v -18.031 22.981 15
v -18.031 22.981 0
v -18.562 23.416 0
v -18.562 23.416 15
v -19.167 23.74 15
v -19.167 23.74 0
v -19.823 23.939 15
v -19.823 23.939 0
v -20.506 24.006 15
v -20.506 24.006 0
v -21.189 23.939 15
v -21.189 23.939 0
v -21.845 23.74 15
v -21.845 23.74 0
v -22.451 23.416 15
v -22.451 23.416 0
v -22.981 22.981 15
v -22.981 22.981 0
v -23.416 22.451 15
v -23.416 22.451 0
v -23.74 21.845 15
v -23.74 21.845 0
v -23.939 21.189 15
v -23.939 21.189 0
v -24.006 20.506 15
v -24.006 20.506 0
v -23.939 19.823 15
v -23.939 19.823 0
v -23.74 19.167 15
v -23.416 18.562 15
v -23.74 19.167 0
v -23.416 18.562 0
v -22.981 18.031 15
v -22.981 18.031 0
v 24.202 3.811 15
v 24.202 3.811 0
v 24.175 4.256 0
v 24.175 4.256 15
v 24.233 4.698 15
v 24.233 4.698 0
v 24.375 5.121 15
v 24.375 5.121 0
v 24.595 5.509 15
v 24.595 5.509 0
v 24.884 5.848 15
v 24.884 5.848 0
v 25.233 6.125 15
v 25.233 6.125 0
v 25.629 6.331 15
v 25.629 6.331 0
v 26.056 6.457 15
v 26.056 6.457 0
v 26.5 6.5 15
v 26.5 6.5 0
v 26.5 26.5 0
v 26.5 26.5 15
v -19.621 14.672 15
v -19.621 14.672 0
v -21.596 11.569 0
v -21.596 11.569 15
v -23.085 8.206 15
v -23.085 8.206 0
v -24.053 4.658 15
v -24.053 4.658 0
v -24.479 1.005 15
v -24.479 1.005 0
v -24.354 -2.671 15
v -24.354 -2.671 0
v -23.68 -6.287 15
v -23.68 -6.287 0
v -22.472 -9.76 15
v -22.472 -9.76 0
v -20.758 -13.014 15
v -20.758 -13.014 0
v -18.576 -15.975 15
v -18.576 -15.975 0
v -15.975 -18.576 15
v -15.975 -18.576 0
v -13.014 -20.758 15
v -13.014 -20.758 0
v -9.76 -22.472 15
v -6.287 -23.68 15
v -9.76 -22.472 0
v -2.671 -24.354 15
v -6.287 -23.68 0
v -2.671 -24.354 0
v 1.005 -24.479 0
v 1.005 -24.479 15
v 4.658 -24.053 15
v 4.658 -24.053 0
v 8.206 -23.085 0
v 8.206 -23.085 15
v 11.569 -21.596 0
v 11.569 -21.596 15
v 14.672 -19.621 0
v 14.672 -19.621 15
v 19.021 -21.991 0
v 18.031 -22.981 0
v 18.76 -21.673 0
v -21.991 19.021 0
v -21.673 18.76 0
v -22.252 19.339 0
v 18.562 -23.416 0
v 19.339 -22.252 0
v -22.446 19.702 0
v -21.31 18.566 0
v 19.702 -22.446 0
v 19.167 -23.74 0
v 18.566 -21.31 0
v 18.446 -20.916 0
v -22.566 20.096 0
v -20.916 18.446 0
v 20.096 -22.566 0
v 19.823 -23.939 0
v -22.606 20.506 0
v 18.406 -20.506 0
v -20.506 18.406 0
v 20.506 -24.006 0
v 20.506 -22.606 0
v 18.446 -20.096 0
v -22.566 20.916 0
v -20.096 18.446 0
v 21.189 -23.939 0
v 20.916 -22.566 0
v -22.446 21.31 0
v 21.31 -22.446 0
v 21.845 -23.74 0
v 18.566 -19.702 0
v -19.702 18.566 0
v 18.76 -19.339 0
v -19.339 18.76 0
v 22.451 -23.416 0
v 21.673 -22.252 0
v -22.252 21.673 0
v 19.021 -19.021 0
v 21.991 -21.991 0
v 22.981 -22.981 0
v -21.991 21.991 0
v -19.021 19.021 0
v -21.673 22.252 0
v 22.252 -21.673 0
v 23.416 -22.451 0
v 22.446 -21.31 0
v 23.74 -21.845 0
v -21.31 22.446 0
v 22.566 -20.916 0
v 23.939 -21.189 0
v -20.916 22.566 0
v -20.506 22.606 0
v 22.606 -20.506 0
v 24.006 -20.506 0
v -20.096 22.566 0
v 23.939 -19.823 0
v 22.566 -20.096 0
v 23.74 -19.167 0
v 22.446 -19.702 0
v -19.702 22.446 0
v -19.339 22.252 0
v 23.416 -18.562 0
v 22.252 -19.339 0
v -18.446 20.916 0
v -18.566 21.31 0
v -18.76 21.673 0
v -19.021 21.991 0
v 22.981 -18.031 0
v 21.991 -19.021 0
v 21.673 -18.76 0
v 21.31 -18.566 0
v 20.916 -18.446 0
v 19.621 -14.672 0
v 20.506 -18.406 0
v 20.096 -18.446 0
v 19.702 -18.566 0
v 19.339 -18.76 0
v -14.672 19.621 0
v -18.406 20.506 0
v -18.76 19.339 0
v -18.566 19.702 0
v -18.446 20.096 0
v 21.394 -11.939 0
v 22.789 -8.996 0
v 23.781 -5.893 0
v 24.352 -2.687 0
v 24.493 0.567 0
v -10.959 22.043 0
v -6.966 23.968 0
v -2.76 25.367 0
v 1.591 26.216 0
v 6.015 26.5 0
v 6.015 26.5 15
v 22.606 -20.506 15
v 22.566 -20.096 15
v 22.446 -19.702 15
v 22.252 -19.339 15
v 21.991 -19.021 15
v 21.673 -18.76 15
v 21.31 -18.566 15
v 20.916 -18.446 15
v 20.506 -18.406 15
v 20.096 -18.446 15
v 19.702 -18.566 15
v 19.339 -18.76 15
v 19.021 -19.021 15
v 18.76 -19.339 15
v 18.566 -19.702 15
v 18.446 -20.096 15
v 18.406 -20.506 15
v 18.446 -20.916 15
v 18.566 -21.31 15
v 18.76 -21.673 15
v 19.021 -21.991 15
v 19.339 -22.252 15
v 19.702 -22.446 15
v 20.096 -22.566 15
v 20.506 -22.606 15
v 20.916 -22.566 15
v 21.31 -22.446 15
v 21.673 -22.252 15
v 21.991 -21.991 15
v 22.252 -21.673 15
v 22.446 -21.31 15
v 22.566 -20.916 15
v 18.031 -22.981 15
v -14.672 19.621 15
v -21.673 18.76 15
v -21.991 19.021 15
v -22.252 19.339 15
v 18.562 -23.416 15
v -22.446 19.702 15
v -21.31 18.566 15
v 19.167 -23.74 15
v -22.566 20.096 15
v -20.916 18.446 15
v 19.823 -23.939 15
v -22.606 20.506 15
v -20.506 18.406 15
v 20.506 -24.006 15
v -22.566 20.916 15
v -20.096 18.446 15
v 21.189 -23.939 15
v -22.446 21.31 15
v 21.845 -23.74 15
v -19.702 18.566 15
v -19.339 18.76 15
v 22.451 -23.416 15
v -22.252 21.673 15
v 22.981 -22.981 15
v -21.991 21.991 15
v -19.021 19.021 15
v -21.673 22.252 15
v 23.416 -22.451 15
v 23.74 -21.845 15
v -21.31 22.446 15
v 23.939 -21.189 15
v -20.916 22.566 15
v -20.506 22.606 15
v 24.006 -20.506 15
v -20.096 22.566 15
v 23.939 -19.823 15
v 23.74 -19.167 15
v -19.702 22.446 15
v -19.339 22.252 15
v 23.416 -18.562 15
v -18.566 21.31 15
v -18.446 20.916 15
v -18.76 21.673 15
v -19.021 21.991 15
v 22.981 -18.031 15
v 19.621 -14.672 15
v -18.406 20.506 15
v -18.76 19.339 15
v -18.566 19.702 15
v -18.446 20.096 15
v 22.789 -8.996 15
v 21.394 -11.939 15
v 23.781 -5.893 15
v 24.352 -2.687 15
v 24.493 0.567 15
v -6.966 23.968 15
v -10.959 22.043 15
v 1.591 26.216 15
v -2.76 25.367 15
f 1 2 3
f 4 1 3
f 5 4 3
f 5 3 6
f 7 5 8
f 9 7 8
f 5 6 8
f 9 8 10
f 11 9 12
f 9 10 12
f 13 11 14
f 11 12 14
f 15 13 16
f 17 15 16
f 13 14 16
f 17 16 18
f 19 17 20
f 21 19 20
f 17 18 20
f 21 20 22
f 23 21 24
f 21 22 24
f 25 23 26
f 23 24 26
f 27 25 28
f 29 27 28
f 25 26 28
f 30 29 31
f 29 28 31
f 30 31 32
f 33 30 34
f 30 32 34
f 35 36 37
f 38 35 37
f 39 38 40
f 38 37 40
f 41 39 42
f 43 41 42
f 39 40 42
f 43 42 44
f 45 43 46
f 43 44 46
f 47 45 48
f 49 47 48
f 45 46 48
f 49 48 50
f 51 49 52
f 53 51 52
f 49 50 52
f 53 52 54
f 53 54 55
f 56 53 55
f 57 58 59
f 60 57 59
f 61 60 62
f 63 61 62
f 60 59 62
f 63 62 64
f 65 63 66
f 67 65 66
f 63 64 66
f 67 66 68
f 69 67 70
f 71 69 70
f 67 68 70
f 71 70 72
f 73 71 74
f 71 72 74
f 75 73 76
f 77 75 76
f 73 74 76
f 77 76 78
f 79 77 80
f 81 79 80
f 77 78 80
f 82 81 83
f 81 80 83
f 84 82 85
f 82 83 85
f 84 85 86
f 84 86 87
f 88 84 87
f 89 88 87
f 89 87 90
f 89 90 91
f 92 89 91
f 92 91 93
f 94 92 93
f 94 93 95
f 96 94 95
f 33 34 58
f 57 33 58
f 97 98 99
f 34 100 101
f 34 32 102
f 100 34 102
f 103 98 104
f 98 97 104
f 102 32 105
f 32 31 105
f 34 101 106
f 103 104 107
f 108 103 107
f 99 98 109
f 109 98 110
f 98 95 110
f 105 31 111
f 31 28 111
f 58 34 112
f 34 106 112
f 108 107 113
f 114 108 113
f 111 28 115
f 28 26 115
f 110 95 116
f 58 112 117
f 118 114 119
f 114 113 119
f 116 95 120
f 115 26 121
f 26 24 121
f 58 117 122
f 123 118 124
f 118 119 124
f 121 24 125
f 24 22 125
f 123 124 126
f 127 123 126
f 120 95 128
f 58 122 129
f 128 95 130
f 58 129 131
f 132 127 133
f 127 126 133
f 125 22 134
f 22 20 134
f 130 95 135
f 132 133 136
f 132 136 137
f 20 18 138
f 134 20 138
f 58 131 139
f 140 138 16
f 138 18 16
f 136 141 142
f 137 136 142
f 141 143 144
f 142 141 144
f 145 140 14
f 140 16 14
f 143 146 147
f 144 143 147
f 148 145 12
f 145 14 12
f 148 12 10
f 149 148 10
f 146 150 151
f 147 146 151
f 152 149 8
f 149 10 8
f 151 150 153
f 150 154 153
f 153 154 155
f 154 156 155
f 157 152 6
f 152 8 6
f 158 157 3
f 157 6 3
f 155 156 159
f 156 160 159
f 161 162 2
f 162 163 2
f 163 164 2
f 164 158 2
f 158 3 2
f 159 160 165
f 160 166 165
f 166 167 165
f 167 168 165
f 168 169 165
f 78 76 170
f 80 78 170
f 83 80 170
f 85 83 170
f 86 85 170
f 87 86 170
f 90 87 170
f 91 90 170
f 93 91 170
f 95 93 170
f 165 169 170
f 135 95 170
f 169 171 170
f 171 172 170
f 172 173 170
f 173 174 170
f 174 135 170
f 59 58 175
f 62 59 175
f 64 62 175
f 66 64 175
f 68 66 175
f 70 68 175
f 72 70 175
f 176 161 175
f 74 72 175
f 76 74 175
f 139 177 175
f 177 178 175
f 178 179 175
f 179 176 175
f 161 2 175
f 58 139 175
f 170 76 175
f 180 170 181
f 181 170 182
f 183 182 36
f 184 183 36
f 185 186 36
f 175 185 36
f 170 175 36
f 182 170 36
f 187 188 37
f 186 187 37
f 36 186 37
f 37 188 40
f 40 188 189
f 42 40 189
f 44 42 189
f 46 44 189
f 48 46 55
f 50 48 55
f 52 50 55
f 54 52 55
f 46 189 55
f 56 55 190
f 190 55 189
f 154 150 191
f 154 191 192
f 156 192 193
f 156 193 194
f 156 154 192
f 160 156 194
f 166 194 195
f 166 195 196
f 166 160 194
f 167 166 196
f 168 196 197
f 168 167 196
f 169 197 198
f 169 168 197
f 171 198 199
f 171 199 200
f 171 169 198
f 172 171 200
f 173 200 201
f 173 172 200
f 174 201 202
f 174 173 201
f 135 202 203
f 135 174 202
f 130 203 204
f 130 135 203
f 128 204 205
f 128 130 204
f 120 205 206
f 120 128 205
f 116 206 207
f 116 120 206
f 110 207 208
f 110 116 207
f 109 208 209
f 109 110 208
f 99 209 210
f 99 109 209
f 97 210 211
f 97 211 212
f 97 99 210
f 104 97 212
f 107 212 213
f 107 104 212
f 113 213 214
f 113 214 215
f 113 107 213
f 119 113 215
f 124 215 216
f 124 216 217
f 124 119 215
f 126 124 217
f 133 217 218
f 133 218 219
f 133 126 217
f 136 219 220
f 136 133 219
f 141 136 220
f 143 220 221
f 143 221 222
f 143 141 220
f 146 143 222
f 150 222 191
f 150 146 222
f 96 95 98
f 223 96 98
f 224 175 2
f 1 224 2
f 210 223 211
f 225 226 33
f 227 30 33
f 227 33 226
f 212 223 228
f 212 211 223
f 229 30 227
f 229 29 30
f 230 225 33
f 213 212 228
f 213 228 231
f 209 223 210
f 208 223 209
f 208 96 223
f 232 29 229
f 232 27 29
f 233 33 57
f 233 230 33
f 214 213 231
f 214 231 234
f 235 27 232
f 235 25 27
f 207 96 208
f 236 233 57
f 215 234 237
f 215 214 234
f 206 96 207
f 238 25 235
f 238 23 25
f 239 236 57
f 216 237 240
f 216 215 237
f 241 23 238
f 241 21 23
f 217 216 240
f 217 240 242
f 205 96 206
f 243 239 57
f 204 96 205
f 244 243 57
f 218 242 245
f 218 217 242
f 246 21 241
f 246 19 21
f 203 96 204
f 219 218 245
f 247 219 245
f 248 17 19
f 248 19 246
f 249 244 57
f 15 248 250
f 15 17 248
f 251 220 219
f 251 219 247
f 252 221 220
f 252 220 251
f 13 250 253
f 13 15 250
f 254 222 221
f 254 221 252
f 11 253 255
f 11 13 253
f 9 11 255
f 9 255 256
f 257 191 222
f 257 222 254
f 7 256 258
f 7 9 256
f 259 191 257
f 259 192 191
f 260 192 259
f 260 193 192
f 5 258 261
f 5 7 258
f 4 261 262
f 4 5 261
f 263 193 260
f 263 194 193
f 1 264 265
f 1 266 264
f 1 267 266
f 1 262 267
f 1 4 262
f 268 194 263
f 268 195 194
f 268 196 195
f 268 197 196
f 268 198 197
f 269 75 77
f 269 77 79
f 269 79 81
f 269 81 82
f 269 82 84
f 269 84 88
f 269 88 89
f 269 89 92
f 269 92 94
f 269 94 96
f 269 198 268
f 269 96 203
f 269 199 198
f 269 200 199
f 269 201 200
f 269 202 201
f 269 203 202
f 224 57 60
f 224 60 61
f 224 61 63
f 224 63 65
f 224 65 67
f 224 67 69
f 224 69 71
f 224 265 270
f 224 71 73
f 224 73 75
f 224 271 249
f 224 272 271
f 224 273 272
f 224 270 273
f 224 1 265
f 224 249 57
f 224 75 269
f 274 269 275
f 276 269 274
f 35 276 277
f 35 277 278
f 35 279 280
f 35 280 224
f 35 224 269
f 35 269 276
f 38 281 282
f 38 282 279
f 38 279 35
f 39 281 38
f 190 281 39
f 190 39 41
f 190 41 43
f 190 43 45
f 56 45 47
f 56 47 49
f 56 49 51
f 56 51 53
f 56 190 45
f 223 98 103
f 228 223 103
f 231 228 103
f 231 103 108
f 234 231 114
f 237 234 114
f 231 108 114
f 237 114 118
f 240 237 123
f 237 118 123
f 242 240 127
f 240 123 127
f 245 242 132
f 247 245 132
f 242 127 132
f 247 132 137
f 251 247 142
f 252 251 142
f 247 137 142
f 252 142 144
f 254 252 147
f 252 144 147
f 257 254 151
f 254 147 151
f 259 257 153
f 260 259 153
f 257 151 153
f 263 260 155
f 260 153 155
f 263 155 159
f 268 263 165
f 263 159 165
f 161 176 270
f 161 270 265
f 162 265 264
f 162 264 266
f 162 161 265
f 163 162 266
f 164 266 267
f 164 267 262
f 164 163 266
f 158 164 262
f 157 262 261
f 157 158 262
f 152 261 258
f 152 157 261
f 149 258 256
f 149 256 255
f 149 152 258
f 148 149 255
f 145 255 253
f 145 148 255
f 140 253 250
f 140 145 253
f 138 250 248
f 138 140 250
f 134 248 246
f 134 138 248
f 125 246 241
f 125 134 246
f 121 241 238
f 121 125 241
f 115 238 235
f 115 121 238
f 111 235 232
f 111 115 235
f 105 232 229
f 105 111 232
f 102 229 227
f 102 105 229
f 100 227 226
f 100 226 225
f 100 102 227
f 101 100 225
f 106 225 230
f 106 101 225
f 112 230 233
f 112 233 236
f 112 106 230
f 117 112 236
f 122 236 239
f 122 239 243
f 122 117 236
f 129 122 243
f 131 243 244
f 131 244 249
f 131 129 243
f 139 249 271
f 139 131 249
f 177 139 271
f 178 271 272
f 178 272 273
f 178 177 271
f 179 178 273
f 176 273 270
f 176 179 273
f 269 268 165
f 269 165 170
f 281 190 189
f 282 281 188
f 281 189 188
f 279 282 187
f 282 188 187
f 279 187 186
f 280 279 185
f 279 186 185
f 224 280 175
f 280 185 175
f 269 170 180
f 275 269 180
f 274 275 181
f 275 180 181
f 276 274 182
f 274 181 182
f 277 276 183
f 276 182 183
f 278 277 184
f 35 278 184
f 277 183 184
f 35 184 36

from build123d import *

# Parameters (mm, degrees)
SKETCH1_R           = 2.1
BOSS_EXTRUDE1_DEPTH = 15


with BuildPart() as part:
    # Sketch1 → Boss-Extrude1 (new body)
    with BuildSketch(Plane.XY):
        with BuildLine():
            Line((-22.980970389, 18.03122292), (-19.621301934, 14.671554465))
            ThreePointArc((-19.621301934, 14.671554465), (-17.324116139, -17.324116139), (14.671554465, -19.621301934))
            Line((14.671554465, -19.621301934), (18.03122292, -22.980970389))
            ThreePointArc((18.03122292, -22.980970389), (22.980970389, -22.980970389), (22.980970389, -18.03122292))
            Line((22.980970389, -18.03122292), (19.621301934, -14.671554465))
            ThreePointArc((19.621301934, -14.671554465), (23.780652377, -5.893265015), (24.201713513, 3.811438449))
            ThreePointArc((24.201713513, 3.811438449), (24.731491872, 5.685176303), (26.5, 6.5))
            Line((26.5, 6.5), (26.5, 26.5))
            Line((26.5, 26.5), (6.014536774, 26.5))
            ThreePointArc((6.014536774, 26.5), (-4.885358384, 24.735246981), (-14.671554465, 19.621301934))
            Line((-14.671554465, 19.621301934), (-18.03122292, 22.980970389))
            ThreePointArc((-18.03122292, 22.980970389), (-22.980970389, 22.980970389), (-22.980970389, 18.03122292))
        make_face()
        with Locations((-20.506096654, 20.506096654)):
            Circle(SKETCH1_R, mode=Mode.SUBTRACT)
        with Locations((20.506096654, -20.506096654)):
            Circle(SKETCH1_R, mode=Mode.SUBTRACT)
    extrude(amount=BOSS_EXTRUDE1_DEPTH)


solid = part.part
